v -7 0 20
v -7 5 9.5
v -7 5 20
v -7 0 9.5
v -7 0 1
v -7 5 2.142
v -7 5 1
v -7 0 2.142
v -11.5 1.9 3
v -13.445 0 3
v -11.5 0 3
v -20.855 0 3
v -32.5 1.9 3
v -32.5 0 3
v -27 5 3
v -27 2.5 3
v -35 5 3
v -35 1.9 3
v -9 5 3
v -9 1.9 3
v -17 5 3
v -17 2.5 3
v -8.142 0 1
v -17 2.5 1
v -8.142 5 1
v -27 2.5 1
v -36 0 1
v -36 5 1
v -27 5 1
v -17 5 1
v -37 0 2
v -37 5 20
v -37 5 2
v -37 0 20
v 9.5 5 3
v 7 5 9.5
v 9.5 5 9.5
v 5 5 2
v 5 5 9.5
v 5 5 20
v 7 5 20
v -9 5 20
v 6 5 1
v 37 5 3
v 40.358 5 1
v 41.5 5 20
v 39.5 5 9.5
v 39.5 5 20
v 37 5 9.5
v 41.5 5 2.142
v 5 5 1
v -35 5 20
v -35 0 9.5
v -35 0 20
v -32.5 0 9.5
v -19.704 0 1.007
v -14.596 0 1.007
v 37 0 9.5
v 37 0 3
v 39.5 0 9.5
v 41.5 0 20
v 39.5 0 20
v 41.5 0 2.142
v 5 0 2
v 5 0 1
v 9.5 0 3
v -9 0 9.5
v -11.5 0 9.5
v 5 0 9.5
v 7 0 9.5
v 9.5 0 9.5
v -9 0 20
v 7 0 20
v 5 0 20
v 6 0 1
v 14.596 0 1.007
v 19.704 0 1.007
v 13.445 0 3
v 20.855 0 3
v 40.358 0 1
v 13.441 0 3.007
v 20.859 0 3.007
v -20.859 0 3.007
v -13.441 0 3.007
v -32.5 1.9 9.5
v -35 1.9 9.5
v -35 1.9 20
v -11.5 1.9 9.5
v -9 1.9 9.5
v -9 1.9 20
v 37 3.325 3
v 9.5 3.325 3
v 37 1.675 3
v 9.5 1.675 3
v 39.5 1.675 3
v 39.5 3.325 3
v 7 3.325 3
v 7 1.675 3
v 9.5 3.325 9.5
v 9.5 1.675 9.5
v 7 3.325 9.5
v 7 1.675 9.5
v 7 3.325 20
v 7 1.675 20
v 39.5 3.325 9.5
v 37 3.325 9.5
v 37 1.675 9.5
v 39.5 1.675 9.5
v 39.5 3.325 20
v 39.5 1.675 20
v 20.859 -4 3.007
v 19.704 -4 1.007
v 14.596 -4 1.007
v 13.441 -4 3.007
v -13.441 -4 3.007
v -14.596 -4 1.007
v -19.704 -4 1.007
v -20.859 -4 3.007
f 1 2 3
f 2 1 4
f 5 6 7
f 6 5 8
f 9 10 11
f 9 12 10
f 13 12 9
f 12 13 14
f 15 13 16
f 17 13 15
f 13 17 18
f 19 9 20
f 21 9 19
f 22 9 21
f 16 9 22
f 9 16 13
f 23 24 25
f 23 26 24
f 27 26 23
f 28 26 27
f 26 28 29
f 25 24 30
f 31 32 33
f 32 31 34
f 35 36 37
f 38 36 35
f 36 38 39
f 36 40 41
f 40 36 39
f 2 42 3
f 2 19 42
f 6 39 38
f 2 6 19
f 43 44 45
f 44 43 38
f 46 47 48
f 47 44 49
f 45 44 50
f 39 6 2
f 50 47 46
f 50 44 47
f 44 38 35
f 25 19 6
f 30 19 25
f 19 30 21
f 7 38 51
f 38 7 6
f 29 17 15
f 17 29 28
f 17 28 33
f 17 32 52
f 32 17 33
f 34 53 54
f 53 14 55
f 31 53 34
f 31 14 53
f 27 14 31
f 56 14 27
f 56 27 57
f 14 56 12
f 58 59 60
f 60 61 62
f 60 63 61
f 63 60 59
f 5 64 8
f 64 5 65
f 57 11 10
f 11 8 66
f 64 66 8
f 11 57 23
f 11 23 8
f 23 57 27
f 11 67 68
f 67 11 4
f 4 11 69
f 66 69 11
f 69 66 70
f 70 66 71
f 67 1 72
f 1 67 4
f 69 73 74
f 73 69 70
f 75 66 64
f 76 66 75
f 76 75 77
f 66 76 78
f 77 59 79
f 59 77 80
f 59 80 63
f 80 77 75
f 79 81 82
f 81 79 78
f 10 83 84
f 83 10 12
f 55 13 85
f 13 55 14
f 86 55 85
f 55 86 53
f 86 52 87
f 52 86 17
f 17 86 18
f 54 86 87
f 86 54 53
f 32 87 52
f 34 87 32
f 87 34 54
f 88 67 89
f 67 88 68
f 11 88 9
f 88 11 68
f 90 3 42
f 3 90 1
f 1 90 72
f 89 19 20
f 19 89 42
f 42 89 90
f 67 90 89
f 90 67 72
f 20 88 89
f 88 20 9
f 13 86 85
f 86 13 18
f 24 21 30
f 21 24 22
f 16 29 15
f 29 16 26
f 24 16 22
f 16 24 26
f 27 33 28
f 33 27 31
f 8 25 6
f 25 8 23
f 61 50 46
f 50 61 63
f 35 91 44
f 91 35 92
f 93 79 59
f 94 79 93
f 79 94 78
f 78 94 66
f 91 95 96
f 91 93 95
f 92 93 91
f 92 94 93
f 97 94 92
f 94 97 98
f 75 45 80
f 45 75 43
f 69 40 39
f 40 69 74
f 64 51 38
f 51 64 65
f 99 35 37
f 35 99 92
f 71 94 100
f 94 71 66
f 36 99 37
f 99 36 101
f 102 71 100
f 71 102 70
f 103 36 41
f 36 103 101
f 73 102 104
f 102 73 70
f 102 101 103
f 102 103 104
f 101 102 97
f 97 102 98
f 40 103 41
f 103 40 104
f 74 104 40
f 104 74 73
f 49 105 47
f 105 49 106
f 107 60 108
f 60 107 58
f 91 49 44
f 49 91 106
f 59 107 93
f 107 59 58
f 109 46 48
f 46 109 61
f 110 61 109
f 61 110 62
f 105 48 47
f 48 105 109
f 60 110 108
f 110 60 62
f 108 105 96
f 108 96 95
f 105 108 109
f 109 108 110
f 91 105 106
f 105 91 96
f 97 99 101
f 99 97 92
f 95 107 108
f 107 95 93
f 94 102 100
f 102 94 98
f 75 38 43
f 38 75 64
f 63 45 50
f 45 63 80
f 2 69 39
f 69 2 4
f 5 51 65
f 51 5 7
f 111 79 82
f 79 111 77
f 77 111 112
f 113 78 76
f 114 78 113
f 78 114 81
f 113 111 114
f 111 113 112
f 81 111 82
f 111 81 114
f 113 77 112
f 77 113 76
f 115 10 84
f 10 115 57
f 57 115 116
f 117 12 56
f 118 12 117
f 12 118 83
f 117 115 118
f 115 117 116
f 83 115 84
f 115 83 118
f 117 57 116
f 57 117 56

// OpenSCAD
  // ht=4+5;
  // bb=0;
  // usbHole=false;

  // ht=0;
  //  bb=10;


//boardMount(9,0,false);
boardMount(0,10,true);

module boardMount(ht,bb,usbHole) {
  w1=26;
  t1=1.20;
 
  w2=32.5;
  t2=1.65;
 
  d=12;

  m=w1+5+d/2;
  
  hr=5.1;


  

  translate([-m,0,0]) {
    boardStand(w1,t1,bb,usbHole);
    translate([w1+4+d,0,0]) boardStand(w2,t2);
    translate([w1+4,0,1]) cube([d,5,8.5]);
  }
    


  translate([17.15,ht,hr*sqrt(3)/2+1]) rotate([90,0,0]) intersection() {
    cylinder(r=hr,h=4,$fn=6);
    translate([-hr,-hr+0.69,0]) cube([hr*2,2,4]);
  }
  translate([-17.15,ht,hr*sqrt(3)/2+1]) rotate([90,0,0]) intersection() {
    cylinder(r=hr,h=4,$fn=6);
    translate([-hr,-hr+0.69,0]) cube([hr*2,2,4]);
  }
}


module boardStand(bw,bt,bb=0,usbHole=false) {
  difference() {
    translate([0,0,1]) union() {
      cube([bw+4,5,2]);
      cube([4.5,5,8.5]);
      cube([2,5,19]);
      translate([bw-0.5,0,0]) cube([4.5,5,8.5]);
      translate([bw+2,0,0]) cube([2,5,19]);
    }
    translate([2,(5-bt)/2,3]) cube([bw,bt+bb,20]);
    if(usbHole) {
      translate([bw/2-3,2.5,-1]) cube([10,3.5,20]);
    }
   translate([4,0,-2]) rotate([0,-135,0]) translate([0,-1,0]) cube([10,20,10]);
      translate([bw+14,0,-2]) rotate([0,-135,0]) translate([0,-1,0]) cube([10,20,10]);

  }
}
